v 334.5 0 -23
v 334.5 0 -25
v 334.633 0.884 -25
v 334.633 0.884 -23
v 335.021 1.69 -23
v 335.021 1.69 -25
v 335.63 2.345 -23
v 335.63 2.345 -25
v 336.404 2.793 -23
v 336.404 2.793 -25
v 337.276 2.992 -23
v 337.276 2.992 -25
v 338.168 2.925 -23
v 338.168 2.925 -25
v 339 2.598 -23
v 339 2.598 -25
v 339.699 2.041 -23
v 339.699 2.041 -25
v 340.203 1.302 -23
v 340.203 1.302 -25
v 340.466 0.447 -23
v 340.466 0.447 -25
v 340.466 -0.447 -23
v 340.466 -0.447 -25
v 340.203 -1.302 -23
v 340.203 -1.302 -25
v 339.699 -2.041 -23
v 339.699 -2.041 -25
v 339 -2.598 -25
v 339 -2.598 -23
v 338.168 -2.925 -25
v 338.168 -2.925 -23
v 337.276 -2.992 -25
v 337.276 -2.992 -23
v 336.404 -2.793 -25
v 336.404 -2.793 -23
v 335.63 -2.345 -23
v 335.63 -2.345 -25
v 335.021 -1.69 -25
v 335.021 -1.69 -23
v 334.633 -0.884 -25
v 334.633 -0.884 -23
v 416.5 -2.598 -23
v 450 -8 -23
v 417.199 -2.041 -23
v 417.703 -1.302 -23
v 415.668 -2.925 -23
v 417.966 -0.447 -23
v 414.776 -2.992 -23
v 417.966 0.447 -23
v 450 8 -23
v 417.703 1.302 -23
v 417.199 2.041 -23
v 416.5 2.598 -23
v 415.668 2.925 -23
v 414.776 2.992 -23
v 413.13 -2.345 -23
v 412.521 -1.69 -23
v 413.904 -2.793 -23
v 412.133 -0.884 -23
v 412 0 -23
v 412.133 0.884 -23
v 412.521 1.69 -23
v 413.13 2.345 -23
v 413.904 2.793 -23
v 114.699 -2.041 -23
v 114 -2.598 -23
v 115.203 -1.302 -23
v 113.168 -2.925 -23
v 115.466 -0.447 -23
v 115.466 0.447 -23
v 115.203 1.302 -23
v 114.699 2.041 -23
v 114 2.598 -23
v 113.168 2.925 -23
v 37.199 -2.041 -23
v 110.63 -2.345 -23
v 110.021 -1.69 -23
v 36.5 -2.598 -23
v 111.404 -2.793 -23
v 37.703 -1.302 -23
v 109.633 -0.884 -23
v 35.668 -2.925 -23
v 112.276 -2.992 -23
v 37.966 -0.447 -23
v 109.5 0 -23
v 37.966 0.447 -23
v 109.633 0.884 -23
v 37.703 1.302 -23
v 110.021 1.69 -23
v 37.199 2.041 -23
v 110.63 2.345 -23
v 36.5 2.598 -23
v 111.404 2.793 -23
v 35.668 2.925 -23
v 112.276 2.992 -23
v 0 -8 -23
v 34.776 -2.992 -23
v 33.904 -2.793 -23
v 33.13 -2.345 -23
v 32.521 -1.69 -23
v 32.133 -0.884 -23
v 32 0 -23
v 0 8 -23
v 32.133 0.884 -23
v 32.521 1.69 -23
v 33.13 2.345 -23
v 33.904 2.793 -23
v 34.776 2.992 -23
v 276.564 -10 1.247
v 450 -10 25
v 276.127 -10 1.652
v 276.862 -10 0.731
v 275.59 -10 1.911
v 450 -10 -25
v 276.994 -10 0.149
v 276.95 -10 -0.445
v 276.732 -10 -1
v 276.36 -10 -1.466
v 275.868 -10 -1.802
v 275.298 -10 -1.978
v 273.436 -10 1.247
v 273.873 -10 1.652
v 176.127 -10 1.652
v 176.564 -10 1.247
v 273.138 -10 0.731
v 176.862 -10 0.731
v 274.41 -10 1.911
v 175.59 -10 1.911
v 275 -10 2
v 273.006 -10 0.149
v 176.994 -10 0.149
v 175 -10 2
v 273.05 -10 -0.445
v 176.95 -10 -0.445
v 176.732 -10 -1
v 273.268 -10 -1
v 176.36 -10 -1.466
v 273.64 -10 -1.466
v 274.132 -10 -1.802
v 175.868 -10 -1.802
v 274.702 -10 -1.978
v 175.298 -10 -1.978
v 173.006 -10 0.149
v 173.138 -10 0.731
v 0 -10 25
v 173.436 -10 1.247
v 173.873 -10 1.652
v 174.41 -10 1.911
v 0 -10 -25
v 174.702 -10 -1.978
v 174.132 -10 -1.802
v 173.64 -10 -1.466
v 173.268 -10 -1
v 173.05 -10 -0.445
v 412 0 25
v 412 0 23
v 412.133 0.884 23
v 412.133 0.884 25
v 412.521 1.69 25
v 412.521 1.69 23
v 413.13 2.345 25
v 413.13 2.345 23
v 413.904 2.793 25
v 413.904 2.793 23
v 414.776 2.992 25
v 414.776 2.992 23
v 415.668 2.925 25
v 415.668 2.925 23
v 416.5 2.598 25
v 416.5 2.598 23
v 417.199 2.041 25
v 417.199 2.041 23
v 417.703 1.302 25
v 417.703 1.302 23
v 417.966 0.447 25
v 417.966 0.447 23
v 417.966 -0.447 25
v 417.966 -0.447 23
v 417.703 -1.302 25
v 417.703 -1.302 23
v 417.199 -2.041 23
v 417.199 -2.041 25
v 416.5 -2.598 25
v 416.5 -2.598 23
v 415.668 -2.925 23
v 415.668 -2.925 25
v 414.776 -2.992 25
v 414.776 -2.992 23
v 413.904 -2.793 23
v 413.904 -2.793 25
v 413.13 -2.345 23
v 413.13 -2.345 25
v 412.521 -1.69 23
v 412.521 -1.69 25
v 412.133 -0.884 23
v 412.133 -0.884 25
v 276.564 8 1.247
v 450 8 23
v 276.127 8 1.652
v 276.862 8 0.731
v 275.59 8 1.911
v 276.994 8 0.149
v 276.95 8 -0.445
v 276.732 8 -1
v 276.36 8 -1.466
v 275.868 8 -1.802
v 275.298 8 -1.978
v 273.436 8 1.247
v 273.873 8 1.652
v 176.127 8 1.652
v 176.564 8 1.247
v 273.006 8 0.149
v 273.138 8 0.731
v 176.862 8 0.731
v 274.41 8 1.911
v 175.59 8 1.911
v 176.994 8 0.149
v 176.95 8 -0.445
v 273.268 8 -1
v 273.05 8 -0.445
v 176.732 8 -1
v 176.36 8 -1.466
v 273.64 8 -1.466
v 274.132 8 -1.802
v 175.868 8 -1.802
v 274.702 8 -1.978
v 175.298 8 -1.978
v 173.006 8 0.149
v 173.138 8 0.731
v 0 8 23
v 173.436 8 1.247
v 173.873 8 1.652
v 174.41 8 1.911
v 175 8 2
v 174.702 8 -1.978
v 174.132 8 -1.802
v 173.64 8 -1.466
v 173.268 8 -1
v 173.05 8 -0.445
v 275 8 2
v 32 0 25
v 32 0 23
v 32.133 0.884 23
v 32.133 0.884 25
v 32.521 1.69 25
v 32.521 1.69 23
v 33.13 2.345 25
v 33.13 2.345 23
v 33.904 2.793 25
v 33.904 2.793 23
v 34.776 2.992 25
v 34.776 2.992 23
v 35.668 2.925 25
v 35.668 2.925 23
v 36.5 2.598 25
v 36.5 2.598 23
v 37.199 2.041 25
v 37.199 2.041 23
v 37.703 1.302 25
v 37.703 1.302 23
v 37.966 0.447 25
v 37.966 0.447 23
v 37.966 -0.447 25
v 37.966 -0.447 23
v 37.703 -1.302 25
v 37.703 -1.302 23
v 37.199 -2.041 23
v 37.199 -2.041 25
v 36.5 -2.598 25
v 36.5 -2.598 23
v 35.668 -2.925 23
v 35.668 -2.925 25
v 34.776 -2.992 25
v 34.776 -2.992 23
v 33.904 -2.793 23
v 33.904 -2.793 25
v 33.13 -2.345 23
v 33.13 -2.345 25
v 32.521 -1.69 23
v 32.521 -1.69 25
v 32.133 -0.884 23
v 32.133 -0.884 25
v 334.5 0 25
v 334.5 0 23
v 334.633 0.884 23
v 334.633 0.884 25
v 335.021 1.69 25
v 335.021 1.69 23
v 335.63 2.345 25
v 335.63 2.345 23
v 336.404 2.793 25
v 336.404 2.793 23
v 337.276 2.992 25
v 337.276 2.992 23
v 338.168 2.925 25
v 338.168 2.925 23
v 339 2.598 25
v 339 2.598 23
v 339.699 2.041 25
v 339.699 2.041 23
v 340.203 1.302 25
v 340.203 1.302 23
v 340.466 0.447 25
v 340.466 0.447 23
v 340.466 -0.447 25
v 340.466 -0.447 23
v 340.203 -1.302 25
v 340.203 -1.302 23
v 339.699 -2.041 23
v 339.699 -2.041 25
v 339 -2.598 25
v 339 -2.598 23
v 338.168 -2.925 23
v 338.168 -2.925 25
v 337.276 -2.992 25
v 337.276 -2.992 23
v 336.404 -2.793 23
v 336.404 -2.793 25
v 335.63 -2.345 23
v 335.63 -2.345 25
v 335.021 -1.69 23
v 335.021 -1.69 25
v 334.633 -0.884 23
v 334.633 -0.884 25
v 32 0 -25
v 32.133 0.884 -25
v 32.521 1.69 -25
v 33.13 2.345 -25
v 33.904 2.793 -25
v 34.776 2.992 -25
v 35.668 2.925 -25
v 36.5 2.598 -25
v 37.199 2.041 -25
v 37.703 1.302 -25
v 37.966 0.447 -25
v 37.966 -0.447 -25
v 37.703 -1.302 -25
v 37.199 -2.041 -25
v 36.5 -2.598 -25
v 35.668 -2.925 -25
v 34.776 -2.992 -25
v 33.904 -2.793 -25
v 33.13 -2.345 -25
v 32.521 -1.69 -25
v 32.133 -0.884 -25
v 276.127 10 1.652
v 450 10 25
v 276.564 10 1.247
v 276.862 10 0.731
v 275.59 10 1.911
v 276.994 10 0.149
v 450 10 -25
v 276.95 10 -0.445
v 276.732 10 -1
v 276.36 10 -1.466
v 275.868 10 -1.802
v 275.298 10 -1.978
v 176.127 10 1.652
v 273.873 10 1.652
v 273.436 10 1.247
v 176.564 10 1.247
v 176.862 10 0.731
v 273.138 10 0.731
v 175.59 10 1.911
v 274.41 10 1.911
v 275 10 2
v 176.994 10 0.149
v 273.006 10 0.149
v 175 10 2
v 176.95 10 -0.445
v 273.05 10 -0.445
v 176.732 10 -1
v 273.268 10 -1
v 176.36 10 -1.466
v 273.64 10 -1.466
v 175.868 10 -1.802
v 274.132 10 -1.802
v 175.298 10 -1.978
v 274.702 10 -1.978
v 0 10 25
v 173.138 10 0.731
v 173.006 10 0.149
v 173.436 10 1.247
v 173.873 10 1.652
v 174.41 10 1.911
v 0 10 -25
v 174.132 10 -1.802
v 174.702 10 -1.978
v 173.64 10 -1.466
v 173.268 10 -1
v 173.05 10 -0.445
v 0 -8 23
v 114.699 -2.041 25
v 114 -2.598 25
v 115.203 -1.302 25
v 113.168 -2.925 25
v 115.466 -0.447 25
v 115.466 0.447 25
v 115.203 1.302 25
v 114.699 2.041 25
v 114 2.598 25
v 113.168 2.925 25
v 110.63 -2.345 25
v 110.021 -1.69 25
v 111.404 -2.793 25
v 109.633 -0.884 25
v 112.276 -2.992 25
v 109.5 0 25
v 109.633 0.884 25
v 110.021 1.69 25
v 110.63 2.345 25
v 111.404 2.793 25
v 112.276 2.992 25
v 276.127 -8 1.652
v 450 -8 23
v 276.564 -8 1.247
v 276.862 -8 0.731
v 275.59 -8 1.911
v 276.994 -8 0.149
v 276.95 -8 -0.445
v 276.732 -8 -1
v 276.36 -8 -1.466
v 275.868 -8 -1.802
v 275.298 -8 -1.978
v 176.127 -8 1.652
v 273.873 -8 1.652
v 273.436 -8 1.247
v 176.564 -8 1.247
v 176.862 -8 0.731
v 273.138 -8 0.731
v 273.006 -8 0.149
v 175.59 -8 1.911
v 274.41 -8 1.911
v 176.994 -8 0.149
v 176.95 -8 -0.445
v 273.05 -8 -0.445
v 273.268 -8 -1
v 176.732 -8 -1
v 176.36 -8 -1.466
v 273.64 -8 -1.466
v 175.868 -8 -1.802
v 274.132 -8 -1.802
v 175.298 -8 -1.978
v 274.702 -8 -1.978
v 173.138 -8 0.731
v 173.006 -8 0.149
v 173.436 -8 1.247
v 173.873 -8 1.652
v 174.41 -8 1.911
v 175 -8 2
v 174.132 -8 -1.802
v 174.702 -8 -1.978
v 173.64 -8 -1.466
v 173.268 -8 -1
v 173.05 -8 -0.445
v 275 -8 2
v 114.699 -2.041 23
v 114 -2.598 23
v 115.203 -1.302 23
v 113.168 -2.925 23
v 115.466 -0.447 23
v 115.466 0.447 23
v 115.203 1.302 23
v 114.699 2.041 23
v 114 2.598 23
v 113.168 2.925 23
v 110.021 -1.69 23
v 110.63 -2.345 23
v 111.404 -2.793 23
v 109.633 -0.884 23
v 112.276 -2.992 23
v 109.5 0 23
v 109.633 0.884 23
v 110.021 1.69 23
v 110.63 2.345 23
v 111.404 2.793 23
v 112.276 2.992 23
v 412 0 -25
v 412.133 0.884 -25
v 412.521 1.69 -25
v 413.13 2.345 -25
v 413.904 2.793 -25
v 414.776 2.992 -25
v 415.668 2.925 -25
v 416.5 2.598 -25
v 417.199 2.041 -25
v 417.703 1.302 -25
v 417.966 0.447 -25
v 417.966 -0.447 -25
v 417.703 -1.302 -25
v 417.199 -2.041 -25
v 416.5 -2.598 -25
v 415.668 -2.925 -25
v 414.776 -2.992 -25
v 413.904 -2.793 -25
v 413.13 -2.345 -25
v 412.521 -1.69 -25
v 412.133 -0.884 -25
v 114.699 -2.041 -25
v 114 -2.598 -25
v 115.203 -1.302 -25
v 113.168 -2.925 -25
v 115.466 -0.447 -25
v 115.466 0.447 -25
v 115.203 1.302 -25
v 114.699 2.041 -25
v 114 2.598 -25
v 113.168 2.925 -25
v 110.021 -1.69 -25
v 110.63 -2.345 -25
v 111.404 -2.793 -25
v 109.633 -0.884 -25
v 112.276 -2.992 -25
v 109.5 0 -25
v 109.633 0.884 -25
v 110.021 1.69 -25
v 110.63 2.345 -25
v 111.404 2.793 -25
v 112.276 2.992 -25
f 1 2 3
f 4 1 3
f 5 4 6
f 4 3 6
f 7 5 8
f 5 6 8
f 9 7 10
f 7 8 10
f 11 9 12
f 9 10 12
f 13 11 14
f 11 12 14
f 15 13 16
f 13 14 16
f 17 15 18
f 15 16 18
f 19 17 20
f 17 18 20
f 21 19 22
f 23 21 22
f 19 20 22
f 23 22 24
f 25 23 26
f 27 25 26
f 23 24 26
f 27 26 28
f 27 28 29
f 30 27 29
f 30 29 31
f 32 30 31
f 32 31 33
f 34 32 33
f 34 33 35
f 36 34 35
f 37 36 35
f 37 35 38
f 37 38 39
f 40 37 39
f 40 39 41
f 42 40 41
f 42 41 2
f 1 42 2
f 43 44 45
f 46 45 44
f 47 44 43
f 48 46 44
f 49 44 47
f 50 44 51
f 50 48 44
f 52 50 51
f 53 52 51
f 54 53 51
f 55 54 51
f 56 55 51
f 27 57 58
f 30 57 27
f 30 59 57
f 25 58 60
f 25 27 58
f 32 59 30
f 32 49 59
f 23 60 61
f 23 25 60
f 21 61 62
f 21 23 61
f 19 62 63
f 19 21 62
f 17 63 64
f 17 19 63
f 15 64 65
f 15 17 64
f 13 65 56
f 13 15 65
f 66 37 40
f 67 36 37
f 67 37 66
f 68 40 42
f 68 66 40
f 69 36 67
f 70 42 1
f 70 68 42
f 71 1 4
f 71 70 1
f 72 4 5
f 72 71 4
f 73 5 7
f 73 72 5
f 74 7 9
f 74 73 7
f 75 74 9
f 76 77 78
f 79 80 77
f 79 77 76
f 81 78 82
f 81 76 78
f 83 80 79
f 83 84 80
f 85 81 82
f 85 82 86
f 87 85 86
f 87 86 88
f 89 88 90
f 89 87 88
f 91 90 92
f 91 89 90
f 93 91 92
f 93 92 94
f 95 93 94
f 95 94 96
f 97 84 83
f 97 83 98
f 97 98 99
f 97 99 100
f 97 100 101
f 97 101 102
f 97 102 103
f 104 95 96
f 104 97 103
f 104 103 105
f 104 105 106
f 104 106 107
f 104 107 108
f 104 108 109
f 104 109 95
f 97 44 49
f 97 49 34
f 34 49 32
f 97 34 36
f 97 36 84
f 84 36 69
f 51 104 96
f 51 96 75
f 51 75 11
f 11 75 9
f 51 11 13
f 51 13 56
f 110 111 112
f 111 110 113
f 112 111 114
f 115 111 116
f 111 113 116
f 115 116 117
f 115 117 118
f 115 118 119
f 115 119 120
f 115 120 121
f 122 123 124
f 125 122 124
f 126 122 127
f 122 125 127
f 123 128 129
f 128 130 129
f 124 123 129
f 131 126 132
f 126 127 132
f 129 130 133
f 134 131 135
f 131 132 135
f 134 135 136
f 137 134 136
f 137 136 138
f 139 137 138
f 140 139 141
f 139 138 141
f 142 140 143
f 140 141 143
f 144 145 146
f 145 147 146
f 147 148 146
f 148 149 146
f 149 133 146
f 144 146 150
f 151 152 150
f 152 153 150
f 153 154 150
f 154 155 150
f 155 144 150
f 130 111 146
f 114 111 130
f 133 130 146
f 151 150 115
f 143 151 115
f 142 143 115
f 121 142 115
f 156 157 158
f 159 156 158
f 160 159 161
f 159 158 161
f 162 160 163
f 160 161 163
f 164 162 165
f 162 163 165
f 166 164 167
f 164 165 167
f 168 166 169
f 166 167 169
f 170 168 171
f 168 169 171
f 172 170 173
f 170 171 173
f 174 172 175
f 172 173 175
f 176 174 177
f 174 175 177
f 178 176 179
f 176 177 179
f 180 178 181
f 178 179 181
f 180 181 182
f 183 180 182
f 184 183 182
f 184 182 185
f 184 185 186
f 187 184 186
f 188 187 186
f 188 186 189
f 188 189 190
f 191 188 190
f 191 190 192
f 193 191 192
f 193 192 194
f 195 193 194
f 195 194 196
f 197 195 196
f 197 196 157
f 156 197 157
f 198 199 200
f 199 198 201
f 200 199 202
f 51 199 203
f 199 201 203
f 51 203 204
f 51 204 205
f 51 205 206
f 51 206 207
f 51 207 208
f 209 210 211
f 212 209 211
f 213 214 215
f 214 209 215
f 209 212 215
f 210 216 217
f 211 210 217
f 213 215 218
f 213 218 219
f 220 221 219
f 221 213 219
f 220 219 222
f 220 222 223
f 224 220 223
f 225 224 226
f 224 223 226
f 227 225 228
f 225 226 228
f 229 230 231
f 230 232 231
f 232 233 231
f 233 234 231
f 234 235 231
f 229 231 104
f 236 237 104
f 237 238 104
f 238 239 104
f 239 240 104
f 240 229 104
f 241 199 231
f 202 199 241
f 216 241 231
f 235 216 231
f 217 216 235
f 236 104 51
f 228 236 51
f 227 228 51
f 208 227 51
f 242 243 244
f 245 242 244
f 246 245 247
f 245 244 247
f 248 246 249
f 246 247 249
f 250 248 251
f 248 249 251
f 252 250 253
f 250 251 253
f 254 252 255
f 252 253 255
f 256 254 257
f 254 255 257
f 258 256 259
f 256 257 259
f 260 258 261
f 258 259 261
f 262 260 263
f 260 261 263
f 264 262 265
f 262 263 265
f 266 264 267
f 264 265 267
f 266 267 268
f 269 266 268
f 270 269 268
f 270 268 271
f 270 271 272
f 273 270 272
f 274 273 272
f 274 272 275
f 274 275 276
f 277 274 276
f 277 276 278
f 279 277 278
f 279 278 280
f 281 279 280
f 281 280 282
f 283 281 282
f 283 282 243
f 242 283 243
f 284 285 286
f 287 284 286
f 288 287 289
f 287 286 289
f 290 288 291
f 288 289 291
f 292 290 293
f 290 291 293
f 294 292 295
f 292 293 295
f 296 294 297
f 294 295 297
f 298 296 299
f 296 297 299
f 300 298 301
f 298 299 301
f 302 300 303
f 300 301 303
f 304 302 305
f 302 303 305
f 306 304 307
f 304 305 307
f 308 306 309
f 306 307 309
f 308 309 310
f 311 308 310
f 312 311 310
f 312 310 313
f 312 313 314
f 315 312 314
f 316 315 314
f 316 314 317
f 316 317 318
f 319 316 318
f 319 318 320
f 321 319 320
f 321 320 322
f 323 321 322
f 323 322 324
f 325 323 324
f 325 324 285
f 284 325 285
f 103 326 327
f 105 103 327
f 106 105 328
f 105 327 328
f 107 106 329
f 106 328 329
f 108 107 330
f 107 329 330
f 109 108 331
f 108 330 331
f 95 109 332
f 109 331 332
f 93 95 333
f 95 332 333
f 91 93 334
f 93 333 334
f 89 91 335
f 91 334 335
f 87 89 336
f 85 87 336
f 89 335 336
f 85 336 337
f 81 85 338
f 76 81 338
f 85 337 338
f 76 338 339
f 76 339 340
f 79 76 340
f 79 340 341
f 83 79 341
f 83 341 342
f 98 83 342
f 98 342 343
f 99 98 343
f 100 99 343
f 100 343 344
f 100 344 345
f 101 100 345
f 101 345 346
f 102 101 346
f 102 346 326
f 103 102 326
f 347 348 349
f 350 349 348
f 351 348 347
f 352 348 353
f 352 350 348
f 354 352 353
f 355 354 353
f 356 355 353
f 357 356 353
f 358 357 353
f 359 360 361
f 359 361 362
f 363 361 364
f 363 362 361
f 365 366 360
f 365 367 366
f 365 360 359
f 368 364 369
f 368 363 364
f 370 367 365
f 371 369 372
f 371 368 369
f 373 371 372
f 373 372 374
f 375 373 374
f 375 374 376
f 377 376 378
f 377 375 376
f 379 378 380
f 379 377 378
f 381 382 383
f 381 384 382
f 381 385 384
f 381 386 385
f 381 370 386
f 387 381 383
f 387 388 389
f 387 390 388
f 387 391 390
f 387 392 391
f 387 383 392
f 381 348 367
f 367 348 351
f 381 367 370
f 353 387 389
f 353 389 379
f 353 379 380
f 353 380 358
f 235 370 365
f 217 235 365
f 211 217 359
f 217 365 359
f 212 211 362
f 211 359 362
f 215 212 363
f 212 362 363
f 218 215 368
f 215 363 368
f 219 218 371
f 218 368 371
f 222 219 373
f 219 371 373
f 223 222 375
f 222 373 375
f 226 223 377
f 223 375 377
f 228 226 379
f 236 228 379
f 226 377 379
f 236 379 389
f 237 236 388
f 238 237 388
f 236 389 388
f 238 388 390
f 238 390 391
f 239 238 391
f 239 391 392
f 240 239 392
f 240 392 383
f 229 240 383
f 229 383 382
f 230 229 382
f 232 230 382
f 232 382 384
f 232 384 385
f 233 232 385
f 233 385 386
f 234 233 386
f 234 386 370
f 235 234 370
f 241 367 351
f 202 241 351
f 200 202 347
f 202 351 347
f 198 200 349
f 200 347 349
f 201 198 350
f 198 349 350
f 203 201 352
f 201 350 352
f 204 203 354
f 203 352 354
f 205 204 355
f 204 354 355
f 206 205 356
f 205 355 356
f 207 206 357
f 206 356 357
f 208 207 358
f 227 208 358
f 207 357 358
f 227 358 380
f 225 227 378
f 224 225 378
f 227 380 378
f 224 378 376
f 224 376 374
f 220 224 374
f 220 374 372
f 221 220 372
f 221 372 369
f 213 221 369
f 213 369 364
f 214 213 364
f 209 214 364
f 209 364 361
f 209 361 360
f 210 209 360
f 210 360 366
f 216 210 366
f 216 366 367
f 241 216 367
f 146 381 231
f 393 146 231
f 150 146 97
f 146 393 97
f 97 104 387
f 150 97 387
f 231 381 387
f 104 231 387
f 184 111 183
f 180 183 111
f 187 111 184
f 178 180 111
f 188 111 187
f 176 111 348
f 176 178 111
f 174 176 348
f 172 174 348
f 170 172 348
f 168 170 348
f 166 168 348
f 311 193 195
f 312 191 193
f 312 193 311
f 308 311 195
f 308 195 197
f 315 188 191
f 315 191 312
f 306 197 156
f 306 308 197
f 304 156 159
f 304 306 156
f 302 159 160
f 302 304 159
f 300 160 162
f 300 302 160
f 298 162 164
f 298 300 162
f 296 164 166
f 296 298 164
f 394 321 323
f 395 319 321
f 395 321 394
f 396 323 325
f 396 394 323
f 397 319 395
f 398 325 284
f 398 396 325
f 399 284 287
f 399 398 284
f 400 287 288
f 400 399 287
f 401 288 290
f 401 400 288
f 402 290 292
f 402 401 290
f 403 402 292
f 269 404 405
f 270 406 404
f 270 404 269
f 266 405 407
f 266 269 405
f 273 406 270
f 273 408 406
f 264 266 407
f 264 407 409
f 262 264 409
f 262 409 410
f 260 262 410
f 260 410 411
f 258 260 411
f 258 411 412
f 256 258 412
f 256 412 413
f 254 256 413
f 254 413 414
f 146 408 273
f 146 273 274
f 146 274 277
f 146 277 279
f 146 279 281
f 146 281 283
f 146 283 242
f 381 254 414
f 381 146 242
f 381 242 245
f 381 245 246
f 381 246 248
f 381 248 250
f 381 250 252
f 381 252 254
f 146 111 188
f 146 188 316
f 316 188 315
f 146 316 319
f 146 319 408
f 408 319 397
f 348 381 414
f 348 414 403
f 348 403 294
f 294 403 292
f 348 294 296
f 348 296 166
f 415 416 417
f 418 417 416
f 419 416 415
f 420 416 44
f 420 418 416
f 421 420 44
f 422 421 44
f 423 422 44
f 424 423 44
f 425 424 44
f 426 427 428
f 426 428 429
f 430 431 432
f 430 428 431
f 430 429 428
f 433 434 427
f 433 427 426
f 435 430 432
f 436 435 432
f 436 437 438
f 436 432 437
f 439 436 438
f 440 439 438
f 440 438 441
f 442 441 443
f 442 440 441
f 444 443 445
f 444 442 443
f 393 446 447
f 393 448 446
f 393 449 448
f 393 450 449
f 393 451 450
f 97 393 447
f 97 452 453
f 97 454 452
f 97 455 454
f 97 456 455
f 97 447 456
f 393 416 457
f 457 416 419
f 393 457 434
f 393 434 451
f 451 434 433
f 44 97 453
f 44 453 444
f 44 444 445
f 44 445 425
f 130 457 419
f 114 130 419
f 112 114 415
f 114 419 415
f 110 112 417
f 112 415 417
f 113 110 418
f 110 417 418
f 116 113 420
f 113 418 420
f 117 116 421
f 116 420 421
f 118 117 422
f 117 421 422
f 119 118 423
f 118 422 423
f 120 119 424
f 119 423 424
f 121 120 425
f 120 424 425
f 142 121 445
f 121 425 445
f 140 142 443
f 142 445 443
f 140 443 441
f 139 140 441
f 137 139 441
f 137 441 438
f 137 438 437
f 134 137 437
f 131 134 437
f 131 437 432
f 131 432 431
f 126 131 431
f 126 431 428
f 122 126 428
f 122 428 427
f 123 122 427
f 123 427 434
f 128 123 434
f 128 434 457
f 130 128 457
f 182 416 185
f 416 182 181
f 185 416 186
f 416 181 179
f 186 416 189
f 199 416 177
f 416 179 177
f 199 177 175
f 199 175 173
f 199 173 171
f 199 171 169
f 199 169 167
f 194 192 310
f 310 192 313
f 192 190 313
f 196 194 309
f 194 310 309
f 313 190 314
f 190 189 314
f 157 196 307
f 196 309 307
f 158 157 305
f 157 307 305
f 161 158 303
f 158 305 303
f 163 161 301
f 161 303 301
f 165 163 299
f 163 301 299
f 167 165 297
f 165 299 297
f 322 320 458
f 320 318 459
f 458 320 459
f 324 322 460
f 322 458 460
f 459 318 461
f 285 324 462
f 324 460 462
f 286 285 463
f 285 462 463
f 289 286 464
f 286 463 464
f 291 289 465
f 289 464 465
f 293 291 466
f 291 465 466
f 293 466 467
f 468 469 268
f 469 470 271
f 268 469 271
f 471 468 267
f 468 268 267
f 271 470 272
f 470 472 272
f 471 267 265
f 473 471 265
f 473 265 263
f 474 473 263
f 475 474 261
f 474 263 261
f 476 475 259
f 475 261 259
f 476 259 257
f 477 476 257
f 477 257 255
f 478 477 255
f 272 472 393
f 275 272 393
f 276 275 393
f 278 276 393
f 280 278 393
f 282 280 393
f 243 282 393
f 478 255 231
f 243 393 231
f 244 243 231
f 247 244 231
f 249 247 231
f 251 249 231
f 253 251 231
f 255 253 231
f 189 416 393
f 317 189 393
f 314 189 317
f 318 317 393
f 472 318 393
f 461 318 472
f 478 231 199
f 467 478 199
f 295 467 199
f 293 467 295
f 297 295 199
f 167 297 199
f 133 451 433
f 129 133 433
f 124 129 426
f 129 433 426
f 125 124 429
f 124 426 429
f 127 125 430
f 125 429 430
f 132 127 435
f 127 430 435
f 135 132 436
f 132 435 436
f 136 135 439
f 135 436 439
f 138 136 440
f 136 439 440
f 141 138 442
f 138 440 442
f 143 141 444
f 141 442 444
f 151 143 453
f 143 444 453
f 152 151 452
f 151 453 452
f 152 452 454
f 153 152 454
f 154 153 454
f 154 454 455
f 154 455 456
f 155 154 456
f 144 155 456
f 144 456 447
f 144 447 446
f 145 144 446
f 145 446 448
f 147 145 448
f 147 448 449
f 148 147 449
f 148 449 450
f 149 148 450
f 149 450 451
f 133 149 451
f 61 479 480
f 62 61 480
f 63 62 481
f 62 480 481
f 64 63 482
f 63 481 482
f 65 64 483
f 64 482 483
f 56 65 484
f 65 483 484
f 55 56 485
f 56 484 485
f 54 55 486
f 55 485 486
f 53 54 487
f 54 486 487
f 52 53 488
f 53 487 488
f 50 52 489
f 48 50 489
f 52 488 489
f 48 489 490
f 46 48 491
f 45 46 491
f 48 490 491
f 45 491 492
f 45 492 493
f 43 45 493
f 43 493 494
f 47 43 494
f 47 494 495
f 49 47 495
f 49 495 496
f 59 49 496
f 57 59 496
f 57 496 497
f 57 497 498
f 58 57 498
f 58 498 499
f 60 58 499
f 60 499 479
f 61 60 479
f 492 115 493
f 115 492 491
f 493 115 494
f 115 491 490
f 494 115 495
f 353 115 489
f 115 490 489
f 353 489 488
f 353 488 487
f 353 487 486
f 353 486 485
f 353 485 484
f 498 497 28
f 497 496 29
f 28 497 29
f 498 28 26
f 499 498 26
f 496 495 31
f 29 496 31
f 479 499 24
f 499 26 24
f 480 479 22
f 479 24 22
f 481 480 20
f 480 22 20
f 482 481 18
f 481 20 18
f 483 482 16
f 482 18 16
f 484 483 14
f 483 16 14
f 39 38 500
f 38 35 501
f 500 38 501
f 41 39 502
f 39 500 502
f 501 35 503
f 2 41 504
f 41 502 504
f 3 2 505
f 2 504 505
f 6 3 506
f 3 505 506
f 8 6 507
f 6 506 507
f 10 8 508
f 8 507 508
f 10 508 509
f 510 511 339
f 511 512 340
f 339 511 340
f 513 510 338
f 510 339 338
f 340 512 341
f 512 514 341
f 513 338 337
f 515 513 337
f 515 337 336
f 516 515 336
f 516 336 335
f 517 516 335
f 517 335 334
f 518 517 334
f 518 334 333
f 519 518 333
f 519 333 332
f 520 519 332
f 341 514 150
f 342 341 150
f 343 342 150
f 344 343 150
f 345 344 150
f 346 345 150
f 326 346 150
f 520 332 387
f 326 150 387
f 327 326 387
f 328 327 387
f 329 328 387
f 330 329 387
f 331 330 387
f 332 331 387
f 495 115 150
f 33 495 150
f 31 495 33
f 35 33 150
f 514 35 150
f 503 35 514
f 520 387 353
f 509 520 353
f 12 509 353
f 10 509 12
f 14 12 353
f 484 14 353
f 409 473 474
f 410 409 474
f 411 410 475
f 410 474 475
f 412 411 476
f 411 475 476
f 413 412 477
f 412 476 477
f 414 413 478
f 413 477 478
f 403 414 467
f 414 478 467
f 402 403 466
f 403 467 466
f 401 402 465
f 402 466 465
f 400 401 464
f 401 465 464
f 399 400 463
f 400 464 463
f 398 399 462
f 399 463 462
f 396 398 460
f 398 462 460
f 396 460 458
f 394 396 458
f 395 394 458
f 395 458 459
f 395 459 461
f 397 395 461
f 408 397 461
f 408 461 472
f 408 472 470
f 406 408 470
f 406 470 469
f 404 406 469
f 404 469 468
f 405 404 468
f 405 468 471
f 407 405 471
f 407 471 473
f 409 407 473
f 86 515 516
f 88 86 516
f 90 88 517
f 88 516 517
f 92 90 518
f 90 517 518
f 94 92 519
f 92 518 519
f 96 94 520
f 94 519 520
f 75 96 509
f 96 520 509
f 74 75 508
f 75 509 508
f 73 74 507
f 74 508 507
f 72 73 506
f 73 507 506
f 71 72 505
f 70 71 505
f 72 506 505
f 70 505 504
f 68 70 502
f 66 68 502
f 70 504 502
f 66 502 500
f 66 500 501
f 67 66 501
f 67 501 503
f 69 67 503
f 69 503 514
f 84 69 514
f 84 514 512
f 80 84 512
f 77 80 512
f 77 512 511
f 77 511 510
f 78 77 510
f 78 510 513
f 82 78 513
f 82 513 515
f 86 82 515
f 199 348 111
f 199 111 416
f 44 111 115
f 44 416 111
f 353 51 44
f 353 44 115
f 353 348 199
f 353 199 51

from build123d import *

# Parameters (mm, degrees)
SKETCH_1_W          = 50
SKETCH_1_H          = 20
SKETCH_1_W_2        = 46
SKETCH_1_H_2        = 16
EXTRUDE_1_DEPTH     = 450
CUT_EXTRUDE_1_REACH = 454.88
SKETCH_2_R          = 3
CUT_EXTRUDE_2_REACH = 453.137
SKETCH_3_R          = 2


with BuildPart() as part:
    # Эскиз1 → Бобышка-Вытянуть1 (new body)
    with BuildSketch(Plane(origin=(0, 0, 0), x_dir=(0, 0, -1), z_dir=(1, 0, 0))):
        Rectangle(SKETCH_1_W, SKETCH_1_H)
        Rectangle(SKETCH_1_W_2, SKETCH_1_H_2, mode=Mode.SUBTRACT)
    extrude(amount=EXTRUDE_1_DEPTH)

    # Вырез-Вытянуть1: up to this face of the body (flat: up to its plane)
    cut_extrude_1_end = Plane(part.part.faces().sort_by_distance((225, 0, 25))[0])
    # Эскиз2 → Вырез-Вытянуть1 (cut, up to the picked face)
    with BuildSketch(Plane(origin=(0, 0, -25), x_dir=(-1, 0, 0), z_dir=(0, 0, -1)), mode=Mode.PRIVATE) as cut_extrude_1_sk1:
        with Locations((-415, 0)):
            Circle(SKETCH_2_R)
    cut_extrude_1_tool1 = split(extrude(cut_extrude_1_sk1.sketch, amount=-CUT_EXTRUDE_1_REACH, mode=Mode.PRIVATE), bisect_by=cut_extrude_1_end, keep=Keep.BOTH, mode=Mode.PRIVATE)
    # Эскиз2 → Вырез-Вытянуть1 (cut, up to the picked face)
    with BuildSketch(Plane(origin=(0, 0, -25), x_dir=(-1, 0, 0), z_dir=(0, 0, -1)), mode=Mode.PRIVATE) as cut_extrude_1_sk2:
        with Locations((-337.5, 0)):
            Circle(SKETCH_2_R)
    cut_extrude_1_tool2 = split(extrude(cut_extrude_1_sk2.sketch, amount=-CUT_EXTRUDE_1_REACH, mode=Mode.PRIVATE), bisect_by=cut_extrude_1_end, keep=Keep.BOTH, mode=Mode.PRIVATE)
    # Эскиз2 → Вырез-Вытянуть1 (cut, up to the picked face)
    with BuildSketch(Plane(origin=(0, 0, -25), x_dir=(-1, 0, 0), z_dir=(0, 0, -1)), mode=Mode.PRIVATE) as cut_extrude_1_sk3:
        with Locations((-112.5, 0)):
            Circle(SKETCH_2_R)
    cut_extrude_1_tool3 = split(extrude(cut_extrude_1_sk3.sketch, amount=-CUT_EXTRUDE_1_REACH, mode=Mode.PRIVATE), bisect_by=cut_extrude_1_end, keep=Keep.BOTH, mode=Mode.PRIVATE)
    # Эскиз2 → Вырез-Вытянуть1 (cut, up to the picked face)
    with BuildSketch(Plane(origin=(0, 0, -25), x_dir=(-1, 0, 0), z_dir=(0, 0, -1)), mode=Mode.PRIVATE) as cut_extrude_1_sk4:
        with Locations((-35, 0)):
            Circle(SKETCH_2_R)
    cut_extrude_1_tool4 = split(extrude(cut_extrude_1_sk4.sketch, amount=-CUT_EXTRUDE_1_REACH, mode=Mode.PRIVATE), bisect_by=cut_extrude_1_end, keep=Keep.BOTH, mode=Mode.PRIVATE)
    add(cut_extrude_1_tool1.solids().sort_by(Axis((415, 0, -25), (0, 0, 1)))[0], mode=Mode.SUBTRACT)
    add(cut_extrude_1_tool2.solids().sort_by(Axis((337.5, 0, -25), (0, 0, 1)))[0], mode=Mode.SUBTRACT)
    add(cut_extrude_1_tool3.solids().sort_by(Axis((112.5, 0, -25), (0, 0, 1)))[0], mode=Mode.SUBTRACT)
    add(cut_extrude_1_tool4.solids().sort_by(Axis((35, 0, -25), (0, 0, 1)))[0], mode=Mode.SUBTRACT)

    # Вырез-Вытянуть2: up to this face of the body (flat: up to its plane)
    cut_extrude_2_end = Plane(part.part.faces().sort_by_distance((225, -10, 0))[0])
    # Эскиз3 → Вырез-Вытянуть2 (cut, up to the picked face)
    with BuildSketch(Plane(origin=(0, 10, 0), x_dir=(1, 0, 0), z_dir=(0, 1, 0)), mode=Mode.PRIVATE) as cut_extrude_2_sk1:
        with Locations(Location((175, 0, 0), (0, 0, 270))):
            Circle(SKETCH_3_R)
    cut_extrude_2_tool1 = split(extrude(cut_extrude_2_sk1.sketch, amount=-CUT_EXTRUDE_2_REACH, mode=Mode.PRIVATE), bisect_by=cut_extrude_2_end, keep=Keep.BOTH, mode=Mode.PRIVATE)
    # Эскиз3 → Вырез-Вытянуть2 (cut, up to the picked face)
    with BuildSketch(Plane(origin=(0, 10, 0), x_dir=(1, 0, 0), z_dir=(0, 1, 0)), mode=Mode.PRIVATE) as cut_extrude_2_sk2:
        with Locations(Location((275, 0, 0), (0, 0, 270))):
            Circle(SKETCH_3_R)
    cut_extrude_2_tool2 = split(extrude(cut_extrude_2_sk2.sketch, amount=-CUT_EXTRUDE_2_REACH, mode=Mode.PRIVATE), bisect_by=cut_extrude_2_end, keep=Keep.BOTH, mode=Mode.PRIVATE)
    add(cut_extrude_2_tool1.solids().sort_by(Axis((175, 10, 0), (0, -1, 0)))[0], mode=Mode.SUBTRACT)
    add(cut_extrude_2_tool2.solids().sort_by(Axis((275, 10, 0), (0, -1, 0)))[0], mode=Mode.SUBTRACT)


solid = part.part
